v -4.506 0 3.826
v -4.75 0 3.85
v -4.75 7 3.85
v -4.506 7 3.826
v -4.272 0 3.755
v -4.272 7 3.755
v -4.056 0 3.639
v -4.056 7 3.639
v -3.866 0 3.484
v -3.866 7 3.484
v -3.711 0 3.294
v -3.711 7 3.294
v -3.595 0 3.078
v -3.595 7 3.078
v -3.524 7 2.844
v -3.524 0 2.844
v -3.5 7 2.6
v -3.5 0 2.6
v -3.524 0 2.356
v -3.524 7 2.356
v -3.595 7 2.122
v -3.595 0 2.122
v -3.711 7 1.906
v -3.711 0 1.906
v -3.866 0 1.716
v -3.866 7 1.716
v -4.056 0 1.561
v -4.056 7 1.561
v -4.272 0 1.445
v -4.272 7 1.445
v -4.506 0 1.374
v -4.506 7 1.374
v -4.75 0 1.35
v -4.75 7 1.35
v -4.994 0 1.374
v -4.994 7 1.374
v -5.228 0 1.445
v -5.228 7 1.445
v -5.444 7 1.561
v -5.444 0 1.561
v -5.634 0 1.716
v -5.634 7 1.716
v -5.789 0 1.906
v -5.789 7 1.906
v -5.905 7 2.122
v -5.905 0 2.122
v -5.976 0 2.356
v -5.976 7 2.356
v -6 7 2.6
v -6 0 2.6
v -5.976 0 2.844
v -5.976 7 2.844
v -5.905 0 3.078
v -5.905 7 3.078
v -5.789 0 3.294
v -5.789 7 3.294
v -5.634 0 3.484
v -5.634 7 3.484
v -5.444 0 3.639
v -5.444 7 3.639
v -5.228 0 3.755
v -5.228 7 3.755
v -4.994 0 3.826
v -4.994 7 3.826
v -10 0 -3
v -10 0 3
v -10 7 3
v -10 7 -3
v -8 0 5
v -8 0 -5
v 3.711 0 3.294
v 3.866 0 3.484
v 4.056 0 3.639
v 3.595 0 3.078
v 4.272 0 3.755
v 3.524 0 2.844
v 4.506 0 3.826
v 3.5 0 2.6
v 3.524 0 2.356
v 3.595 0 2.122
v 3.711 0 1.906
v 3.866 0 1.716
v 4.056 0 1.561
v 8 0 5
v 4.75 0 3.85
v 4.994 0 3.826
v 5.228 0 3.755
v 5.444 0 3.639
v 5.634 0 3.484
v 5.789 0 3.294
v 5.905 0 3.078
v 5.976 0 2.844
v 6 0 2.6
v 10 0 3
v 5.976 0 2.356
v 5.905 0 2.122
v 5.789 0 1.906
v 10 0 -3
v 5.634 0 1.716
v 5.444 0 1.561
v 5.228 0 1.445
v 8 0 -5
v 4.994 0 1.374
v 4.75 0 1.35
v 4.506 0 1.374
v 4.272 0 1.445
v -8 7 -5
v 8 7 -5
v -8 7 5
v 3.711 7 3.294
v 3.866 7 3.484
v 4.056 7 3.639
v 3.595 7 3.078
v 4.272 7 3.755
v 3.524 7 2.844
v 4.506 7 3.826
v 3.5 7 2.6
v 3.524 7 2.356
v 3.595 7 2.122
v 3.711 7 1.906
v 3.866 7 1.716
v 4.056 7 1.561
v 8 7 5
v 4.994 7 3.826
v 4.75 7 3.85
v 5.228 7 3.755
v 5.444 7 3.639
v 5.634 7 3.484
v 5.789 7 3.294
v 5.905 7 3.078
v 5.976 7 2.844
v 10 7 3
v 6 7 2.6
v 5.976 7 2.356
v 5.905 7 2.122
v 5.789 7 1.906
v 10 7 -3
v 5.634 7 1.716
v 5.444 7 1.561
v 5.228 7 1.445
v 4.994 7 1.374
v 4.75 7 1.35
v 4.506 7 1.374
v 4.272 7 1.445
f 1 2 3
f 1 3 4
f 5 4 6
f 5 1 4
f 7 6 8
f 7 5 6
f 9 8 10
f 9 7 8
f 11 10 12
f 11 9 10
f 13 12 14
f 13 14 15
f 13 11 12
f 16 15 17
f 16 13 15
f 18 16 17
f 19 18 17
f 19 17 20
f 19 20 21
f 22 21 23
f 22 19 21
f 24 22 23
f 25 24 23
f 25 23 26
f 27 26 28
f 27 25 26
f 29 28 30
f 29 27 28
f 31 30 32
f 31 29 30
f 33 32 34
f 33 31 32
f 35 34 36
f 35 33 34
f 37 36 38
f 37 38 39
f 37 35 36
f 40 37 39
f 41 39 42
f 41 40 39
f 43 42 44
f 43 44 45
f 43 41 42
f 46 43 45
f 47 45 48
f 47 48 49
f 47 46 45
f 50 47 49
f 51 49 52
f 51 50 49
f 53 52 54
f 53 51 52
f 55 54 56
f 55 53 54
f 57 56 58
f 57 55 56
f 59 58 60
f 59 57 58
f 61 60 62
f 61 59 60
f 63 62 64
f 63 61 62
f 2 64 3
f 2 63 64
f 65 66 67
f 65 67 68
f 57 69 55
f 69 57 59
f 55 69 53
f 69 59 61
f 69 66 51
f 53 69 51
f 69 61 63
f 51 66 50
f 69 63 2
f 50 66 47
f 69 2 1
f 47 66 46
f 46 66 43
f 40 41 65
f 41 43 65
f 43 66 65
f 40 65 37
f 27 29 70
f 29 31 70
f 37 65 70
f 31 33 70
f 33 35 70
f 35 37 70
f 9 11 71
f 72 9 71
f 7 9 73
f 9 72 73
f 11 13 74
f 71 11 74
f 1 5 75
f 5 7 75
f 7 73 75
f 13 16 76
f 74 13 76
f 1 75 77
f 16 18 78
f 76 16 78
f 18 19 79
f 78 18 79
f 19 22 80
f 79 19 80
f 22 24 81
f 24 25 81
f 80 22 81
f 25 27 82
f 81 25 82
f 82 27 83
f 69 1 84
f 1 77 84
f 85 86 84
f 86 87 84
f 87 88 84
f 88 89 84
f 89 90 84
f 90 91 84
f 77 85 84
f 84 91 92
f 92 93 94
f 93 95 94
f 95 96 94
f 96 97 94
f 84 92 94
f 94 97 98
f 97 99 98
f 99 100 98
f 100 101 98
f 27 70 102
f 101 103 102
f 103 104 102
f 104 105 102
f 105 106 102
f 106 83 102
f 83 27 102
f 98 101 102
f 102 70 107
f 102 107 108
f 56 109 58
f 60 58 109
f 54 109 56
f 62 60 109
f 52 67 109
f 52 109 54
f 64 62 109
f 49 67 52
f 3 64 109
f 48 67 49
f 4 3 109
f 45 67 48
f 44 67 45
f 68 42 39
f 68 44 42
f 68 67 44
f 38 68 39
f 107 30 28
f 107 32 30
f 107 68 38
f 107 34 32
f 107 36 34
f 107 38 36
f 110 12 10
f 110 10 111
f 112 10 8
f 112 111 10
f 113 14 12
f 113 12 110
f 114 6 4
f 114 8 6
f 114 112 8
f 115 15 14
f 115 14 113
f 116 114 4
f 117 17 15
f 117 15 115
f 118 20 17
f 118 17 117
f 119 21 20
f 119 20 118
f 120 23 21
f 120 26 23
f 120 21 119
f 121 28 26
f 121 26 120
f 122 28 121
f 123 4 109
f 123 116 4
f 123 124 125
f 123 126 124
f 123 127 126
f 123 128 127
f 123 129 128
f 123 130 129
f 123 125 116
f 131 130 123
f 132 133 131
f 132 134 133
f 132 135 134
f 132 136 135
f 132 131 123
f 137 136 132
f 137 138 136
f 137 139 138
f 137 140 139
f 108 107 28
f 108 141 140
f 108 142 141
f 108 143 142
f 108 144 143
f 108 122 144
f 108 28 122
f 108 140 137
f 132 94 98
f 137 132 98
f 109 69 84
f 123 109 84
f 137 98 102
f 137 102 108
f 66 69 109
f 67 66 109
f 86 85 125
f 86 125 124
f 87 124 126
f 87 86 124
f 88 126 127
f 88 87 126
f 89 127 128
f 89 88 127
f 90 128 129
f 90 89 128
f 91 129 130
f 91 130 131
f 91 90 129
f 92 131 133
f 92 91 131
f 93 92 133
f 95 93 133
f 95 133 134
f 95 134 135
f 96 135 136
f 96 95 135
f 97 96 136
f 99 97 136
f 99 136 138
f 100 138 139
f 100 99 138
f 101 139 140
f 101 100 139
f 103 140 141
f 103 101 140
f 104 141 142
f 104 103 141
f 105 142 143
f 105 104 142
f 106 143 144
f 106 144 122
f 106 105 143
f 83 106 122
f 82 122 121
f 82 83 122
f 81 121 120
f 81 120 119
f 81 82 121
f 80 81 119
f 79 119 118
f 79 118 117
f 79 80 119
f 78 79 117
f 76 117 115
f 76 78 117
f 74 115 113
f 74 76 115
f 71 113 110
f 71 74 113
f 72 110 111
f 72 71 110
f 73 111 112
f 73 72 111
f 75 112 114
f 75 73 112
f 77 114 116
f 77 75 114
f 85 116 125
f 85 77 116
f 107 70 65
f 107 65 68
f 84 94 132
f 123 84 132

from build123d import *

# Parameters (mm, degrees)
ESQUISSE1_W        = 20
ESQUISSE1_H        = 10
ESQUISSE1_R        = 1.25
BOSS_EXTRU_1_DEPTH = 7
CHANFREIN1_SIZE    = 2


with BuildPart() as part:
    # Esquisse1 → Boss.-Extru.1 (new body)
    with BuildSketch(Plane(origin=(0, 0, 0), x_dir=(1, 0, 0), z_dir=(0, 1, 0))):
        Rectangle(ESQUISSE1_W, ESQUISSE1_H)
        with Locations(Location((4.75, -2.6, 0), (0, 0, 270))):
            Circle(ESQUISSE1_R, mode=Mode.SUBTRACT)
        with Locations(Location((-4.75, -2.6, 0), (0, 0, 270))):
            Circle(ESQUISSE1_R, mode=Mode.SUBTRACT)
    extrude(amount=BOSS_EXTRU_1_DEPTH)

    # Chanfrein1
    chanfrein1_edges = [part.edges().sort_by_distance(p)[0] for p in [
        (10, 3.5, 5),
        (-10, 3.5, 5),
        (-10, 3.5, -5),
        (10, 3.5, -5),
    ]]
    chamfer(chanfrein1_edges, length=CHANFREIN1_SIZE)


solid = part.part
